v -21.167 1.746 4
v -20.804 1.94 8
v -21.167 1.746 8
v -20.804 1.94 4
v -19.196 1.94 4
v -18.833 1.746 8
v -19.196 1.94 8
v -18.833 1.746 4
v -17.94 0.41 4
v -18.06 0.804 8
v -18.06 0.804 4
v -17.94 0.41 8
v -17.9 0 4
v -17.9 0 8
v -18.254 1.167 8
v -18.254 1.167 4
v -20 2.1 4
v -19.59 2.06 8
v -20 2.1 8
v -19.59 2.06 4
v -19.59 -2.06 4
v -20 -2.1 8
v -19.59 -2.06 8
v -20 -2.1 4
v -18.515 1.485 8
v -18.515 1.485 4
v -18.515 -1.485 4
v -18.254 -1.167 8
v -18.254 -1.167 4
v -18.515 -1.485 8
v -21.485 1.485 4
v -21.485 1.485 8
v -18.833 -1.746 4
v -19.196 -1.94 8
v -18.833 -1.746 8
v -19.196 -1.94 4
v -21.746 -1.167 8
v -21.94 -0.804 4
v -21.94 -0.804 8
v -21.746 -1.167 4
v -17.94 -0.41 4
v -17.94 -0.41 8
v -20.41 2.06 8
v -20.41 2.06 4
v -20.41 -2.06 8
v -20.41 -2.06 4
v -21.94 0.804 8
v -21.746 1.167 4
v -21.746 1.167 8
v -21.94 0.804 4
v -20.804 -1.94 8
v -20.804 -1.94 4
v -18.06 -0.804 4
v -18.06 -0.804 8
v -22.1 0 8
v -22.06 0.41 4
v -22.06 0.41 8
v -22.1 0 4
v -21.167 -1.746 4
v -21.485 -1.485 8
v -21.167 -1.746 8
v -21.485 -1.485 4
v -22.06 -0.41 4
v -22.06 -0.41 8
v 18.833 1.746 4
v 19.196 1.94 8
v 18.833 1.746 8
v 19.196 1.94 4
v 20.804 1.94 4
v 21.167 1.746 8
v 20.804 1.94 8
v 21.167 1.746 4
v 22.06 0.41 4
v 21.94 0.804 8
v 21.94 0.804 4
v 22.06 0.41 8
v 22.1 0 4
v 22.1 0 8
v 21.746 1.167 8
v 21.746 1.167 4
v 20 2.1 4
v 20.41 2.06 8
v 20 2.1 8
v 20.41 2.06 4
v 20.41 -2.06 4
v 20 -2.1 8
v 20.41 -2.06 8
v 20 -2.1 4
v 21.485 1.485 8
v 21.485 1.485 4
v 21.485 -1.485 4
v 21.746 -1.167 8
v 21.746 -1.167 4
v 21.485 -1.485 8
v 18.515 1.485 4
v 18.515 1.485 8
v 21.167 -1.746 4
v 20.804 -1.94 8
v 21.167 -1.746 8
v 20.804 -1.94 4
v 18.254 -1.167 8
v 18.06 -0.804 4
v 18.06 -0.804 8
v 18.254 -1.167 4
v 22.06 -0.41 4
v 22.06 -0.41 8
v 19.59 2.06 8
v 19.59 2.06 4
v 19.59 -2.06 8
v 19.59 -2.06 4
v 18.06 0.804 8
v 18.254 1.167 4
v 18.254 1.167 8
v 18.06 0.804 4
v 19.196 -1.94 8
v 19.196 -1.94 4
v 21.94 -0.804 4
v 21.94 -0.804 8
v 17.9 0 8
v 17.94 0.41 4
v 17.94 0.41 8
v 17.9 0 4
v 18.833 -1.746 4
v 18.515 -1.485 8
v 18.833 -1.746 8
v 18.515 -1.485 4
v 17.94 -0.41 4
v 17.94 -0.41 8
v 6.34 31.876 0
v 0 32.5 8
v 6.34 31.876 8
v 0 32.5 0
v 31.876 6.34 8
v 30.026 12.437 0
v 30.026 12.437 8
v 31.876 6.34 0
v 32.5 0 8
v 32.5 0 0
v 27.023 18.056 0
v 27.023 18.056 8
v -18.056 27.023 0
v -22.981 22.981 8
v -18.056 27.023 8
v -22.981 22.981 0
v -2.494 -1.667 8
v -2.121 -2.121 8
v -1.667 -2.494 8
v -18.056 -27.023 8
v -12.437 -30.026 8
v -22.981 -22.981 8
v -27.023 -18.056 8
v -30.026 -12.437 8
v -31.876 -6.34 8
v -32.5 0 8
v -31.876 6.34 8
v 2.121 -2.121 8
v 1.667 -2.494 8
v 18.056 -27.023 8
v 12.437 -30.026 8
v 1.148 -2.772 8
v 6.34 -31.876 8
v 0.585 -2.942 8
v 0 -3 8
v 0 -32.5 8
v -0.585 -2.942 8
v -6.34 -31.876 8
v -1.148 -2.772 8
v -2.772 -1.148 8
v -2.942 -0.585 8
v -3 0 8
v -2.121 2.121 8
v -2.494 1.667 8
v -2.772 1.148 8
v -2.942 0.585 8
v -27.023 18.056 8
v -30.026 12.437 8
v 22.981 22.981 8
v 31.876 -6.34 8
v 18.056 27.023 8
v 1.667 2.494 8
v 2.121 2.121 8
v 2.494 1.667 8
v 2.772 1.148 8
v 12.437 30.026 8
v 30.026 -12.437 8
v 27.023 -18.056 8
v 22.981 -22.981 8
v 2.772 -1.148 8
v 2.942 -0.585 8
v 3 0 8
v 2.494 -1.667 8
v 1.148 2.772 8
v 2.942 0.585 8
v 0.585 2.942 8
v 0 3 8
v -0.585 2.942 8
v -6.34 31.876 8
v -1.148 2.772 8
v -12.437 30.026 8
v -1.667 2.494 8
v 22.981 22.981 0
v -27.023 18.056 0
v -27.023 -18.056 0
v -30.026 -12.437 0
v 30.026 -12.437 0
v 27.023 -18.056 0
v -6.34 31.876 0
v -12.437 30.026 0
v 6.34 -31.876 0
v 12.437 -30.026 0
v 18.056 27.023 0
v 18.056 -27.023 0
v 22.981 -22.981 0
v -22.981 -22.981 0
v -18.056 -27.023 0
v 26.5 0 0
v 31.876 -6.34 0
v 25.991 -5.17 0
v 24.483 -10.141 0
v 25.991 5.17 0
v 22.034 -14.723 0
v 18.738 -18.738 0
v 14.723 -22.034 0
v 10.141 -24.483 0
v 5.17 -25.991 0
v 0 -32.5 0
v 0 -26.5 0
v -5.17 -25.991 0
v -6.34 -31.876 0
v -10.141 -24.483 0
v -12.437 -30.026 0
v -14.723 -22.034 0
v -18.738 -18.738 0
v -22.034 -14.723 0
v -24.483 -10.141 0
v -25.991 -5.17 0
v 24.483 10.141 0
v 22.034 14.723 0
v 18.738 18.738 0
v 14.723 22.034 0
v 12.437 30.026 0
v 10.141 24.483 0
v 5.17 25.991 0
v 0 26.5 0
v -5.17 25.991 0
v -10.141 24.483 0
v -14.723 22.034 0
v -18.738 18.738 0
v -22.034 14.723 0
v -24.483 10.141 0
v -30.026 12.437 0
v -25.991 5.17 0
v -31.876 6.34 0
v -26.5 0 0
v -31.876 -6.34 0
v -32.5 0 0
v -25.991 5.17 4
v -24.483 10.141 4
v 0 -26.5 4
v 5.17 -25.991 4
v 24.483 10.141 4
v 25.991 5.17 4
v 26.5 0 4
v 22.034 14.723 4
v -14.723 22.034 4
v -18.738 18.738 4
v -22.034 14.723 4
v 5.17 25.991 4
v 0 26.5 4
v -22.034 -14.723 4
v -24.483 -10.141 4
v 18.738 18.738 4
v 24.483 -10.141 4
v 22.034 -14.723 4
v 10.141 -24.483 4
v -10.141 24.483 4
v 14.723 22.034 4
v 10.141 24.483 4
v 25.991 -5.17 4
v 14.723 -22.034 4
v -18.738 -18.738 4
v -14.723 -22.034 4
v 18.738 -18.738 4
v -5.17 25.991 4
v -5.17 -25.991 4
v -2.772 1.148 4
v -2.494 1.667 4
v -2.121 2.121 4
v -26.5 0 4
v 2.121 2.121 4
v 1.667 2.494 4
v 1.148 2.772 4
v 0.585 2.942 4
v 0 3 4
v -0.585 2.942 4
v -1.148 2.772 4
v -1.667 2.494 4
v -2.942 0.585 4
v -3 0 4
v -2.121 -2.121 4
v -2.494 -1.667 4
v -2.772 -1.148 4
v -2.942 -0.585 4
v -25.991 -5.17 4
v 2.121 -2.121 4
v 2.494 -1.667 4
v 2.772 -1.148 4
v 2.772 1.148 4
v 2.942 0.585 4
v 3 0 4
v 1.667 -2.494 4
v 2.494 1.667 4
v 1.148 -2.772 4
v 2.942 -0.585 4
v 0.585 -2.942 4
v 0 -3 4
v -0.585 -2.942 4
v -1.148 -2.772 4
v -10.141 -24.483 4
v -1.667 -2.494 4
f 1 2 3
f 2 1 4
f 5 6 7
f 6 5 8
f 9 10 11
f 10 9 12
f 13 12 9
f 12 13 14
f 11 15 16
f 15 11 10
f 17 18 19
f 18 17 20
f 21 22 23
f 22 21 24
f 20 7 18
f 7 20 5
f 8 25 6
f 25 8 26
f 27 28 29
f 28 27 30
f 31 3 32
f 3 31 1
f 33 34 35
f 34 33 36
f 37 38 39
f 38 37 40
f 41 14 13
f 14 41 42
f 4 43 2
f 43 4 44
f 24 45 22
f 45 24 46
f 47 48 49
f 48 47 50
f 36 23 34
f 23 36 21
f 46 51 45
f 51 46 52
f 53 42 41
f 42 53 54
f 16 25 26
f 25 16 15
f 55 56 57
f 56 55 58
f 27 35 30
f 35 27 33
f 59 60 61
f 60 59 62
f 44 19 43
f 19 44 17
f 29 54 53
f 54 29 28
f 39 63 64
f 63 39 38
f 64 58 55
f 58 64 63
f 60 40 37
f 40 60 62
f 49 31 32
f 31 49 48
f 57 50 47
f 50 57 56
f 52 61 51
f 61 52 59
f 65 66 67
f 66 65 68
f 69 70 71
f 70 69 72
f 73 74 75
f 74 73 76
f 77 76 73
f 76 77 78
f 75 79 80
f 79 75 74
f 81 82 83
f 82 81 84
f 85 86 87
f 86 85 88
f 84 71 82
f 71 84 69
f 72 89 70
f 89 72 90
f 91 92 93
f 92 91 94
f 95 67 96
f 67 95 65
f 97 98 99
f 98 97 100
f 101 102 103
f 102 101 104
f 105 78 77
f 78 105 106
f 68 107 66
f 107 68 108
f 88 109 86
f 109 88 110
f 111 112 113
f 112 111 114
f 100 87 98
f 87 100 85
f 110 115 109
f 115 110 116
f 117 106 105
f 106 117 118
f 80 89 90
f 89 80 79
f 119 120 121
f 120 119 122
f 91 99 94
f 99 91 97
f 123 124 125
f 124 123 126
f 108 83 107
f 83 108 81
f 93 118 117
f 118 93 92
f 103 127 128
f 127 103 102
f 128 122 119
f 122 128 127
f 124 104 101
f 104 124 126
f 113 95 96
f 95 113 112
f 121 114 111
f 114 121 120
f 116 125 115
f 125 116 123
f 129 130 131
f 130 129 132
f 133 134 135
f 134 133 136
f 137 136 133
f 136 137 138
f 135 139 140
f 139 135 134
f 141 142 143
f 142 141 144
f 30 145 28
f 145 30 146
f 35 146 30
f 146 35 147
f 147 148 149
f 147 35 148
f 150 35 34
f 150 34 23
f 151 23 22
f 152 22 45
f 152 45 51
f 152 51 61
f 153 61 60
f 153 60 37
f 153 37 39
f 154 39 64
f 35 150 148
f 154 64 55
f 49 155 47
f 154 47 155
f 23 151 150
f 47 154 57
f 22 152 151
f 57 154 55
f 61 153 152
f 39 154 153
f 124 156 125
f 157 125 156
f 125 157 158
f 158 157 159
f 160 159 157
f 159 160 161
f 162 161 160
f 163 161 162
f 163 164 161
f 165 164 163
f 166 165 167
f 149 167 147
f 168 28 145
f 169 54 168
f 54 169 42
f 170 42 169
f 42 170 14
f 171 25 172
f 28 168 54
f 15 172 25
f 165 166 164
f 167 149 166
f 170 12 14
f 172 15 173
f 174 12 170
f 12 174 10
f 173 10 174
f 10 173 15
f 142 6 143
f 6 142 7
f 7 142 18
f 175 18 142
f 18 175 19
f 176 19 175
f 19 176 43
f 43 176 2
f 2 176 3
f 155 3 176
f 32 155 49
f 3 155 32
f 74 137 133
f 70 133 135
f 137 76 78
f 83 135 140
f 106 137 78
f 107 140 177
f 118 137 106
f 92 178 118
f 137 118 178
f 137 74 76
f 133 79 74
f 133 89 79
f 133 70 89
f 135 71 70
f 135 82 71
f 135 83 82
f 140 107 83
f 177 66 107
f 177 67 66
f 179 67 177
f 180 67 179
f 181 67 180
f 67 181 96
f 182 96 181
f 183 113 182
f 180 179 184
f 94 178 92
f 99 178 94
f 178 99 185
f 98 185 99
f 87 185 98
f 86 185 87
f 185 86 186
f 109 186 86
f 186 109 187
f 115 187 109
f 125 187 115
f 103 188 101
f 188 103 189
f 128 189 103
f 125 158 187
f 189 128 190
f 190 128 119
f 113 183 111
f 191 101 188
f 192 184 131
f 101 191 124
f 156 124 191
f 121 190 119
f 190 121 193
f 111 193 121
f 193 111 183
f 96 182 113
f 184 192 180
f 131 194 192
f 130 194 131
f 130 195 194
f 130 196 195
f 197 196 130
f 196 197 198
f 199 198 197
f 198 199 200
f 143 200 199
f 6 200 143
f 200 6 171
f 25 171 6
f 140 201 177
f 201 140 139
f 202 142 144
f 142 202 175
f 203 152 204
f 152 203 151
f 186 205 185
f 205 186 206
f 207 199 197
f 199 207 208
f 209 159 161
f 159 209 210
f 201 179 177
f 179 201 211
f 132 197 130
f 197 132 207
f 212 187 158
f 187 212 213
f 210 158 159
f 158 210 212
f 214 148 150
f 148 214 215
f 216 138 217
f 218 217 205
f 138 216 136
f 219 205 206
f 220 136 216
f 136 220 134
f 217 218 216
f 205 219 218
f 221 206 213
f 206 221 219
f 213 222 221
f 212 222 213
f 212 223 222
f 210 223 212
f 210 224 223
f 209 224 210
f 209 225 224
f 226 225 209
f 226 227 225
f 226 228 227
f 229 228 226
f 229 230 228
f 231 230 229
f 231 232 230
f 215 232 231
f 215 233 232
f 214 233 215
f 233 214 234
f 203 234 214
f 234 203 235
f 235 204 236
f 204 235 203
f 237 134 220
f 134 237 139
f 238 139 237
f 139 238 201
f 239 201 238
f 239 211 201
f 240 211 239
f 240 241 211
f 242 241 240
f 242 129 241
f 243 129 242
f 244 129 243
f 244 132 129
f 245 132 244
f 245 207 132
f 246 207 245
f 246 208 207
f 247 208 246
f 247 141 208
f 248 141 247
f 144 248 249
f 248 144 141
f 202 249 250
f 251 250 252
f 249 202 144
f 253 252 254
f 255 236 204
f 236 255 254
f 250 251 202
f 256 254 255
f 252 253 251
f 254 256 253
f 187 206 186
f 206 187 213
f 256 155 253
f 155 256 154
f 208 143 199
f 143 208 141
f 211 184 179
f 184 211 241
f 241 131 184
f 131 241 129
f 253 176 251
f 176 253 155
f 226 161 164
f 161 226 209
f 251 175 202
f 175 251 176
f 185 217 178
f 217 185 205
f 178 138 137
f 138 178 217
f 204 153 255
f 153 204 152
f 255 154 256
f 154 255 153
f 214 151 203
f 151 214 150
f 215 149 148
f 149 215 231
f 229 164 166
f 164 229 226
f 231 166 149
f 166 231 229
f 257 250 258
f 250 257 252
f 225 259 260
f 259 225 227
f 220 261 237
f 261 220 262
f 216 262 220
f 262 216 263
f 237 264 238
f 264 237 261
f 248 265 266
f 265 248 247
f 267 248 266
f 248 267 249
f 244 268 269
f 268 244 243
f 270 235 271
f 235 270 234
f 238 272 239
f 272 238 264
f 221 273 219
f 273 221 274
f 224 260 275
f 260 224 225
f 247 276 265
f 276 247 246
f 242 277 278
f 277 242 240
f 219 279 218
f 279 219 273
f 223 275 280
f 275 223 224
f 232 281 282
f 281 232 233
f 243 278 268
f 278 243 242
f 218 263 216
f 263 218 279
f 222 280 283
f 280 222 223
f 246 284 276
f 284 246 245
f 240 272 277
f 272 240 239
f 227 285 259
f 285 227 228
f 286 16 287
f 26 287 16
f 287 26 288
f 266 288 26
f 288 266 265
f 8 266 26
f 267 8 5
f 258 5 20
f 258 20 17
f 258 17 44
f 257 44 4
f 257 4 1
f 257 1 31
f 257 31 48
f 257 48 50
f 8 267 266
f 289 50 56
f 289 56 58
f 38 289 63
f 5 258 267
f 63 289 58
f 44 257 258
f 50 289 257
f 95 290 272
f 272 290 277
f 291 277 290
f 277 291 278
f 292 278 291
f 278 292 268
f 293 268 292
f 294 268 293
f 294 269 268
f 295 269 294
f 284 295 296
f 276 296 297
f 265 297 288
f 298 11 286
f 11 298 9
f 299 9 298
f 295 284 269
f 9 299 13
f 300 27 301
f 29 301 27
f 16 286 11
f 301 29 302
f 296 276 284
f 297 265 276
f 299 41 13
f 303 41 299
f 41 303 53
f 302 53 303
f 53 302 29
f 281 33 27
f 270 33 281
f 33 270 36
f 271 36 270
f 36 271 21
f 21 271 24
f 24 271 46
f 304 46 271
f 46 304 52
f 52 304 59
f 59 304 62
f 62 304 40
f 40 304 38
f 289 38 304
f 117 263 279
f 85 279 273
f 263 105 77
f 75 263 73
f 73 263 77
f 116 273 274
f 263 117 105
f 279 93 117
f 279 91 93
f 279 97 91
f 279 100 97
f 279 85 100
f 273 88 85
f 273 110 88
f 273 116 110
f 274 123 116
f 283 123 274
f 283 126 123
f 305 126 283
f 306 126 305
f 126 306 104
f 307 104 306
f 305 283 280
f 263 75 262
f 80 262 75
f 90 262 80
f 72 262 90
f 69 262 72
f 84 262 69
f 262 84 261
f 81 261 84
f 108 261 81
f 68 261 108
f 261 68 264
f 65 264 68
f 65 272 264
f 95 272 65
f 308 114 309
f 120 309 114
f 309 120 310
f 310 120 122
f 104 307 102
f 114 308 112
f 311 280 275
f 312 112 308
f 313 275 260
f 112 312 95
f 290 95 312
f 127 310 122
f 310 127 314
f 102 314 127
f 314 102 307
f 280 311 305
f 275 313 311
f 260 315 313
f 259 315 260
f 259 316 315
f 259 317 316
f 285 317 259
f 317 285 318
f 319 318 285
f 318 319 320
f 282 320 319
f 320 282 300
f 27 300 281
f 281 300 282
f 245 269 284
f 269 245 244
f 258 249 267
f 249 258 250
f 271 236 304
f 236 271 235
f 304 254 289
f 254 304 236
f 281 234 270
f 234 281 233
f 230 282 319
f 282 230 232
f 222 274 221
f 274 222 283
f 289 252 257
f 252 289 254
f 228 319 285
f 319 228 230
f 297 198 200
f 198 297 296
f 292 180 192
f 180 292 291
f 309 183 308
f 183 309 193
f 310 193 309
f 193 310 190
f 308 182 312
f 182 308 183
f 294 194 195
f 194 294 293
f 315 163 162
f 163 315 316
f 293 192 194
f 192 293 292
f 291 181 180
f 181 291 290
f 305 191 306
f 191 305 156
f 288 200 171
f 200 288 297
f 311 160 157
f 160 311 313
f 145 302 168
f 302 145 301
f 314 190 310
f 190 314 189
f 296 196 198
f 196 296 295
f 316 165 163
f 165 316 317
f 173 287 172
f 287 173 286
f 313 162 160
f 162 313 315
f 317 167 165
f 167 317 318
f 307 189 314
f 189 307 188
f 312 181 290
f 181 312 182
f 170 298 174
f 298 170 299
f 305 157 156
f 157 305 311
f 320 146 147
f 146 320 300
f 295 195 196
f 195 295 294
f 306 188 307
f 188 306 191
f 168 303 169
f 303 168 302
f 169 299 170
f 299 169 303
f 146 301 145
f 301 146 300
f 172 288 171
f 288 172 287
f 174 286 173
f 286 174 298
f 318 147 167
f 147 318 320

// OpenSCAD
// PROJECT W.A.L.L. - Modular Suction Cup Manifold Mount
// Adapts corner winch assembly to smooth surface walls via pneumatic suction cup
$fn = 32;

manifold_dia = 65.0;
manifold_thick = 8.0;
fitting_dia = 6.0; // 6mm push-to-connect vacuum fitting
winch_bolt_spacing = 40.0;

module suction_cup_adapter() {
    difference() {
        cylinder(d=manifold_dia, h=manifold_thick);

        // Center vacuum plenum chamber
        translate([0, 0, -1])
            cylinder(d=manifold_dia - 12, h=manifold_thick - 3);

        // Central vacuum port fitting
        translate([0, 0, manifold_thick - 4])
            cylinder(d=fitting_dia, h=5);

        // Winch bracket mounting holes
        for (dx = [-winch_bolt_spacing/2, winch_bolt_spacing/2]) {
            translate([dx, 0, -1])
                cylinder(d=4.2, h=manifold_thick+2);
        }
    }
}

suction_cup_adapter();
